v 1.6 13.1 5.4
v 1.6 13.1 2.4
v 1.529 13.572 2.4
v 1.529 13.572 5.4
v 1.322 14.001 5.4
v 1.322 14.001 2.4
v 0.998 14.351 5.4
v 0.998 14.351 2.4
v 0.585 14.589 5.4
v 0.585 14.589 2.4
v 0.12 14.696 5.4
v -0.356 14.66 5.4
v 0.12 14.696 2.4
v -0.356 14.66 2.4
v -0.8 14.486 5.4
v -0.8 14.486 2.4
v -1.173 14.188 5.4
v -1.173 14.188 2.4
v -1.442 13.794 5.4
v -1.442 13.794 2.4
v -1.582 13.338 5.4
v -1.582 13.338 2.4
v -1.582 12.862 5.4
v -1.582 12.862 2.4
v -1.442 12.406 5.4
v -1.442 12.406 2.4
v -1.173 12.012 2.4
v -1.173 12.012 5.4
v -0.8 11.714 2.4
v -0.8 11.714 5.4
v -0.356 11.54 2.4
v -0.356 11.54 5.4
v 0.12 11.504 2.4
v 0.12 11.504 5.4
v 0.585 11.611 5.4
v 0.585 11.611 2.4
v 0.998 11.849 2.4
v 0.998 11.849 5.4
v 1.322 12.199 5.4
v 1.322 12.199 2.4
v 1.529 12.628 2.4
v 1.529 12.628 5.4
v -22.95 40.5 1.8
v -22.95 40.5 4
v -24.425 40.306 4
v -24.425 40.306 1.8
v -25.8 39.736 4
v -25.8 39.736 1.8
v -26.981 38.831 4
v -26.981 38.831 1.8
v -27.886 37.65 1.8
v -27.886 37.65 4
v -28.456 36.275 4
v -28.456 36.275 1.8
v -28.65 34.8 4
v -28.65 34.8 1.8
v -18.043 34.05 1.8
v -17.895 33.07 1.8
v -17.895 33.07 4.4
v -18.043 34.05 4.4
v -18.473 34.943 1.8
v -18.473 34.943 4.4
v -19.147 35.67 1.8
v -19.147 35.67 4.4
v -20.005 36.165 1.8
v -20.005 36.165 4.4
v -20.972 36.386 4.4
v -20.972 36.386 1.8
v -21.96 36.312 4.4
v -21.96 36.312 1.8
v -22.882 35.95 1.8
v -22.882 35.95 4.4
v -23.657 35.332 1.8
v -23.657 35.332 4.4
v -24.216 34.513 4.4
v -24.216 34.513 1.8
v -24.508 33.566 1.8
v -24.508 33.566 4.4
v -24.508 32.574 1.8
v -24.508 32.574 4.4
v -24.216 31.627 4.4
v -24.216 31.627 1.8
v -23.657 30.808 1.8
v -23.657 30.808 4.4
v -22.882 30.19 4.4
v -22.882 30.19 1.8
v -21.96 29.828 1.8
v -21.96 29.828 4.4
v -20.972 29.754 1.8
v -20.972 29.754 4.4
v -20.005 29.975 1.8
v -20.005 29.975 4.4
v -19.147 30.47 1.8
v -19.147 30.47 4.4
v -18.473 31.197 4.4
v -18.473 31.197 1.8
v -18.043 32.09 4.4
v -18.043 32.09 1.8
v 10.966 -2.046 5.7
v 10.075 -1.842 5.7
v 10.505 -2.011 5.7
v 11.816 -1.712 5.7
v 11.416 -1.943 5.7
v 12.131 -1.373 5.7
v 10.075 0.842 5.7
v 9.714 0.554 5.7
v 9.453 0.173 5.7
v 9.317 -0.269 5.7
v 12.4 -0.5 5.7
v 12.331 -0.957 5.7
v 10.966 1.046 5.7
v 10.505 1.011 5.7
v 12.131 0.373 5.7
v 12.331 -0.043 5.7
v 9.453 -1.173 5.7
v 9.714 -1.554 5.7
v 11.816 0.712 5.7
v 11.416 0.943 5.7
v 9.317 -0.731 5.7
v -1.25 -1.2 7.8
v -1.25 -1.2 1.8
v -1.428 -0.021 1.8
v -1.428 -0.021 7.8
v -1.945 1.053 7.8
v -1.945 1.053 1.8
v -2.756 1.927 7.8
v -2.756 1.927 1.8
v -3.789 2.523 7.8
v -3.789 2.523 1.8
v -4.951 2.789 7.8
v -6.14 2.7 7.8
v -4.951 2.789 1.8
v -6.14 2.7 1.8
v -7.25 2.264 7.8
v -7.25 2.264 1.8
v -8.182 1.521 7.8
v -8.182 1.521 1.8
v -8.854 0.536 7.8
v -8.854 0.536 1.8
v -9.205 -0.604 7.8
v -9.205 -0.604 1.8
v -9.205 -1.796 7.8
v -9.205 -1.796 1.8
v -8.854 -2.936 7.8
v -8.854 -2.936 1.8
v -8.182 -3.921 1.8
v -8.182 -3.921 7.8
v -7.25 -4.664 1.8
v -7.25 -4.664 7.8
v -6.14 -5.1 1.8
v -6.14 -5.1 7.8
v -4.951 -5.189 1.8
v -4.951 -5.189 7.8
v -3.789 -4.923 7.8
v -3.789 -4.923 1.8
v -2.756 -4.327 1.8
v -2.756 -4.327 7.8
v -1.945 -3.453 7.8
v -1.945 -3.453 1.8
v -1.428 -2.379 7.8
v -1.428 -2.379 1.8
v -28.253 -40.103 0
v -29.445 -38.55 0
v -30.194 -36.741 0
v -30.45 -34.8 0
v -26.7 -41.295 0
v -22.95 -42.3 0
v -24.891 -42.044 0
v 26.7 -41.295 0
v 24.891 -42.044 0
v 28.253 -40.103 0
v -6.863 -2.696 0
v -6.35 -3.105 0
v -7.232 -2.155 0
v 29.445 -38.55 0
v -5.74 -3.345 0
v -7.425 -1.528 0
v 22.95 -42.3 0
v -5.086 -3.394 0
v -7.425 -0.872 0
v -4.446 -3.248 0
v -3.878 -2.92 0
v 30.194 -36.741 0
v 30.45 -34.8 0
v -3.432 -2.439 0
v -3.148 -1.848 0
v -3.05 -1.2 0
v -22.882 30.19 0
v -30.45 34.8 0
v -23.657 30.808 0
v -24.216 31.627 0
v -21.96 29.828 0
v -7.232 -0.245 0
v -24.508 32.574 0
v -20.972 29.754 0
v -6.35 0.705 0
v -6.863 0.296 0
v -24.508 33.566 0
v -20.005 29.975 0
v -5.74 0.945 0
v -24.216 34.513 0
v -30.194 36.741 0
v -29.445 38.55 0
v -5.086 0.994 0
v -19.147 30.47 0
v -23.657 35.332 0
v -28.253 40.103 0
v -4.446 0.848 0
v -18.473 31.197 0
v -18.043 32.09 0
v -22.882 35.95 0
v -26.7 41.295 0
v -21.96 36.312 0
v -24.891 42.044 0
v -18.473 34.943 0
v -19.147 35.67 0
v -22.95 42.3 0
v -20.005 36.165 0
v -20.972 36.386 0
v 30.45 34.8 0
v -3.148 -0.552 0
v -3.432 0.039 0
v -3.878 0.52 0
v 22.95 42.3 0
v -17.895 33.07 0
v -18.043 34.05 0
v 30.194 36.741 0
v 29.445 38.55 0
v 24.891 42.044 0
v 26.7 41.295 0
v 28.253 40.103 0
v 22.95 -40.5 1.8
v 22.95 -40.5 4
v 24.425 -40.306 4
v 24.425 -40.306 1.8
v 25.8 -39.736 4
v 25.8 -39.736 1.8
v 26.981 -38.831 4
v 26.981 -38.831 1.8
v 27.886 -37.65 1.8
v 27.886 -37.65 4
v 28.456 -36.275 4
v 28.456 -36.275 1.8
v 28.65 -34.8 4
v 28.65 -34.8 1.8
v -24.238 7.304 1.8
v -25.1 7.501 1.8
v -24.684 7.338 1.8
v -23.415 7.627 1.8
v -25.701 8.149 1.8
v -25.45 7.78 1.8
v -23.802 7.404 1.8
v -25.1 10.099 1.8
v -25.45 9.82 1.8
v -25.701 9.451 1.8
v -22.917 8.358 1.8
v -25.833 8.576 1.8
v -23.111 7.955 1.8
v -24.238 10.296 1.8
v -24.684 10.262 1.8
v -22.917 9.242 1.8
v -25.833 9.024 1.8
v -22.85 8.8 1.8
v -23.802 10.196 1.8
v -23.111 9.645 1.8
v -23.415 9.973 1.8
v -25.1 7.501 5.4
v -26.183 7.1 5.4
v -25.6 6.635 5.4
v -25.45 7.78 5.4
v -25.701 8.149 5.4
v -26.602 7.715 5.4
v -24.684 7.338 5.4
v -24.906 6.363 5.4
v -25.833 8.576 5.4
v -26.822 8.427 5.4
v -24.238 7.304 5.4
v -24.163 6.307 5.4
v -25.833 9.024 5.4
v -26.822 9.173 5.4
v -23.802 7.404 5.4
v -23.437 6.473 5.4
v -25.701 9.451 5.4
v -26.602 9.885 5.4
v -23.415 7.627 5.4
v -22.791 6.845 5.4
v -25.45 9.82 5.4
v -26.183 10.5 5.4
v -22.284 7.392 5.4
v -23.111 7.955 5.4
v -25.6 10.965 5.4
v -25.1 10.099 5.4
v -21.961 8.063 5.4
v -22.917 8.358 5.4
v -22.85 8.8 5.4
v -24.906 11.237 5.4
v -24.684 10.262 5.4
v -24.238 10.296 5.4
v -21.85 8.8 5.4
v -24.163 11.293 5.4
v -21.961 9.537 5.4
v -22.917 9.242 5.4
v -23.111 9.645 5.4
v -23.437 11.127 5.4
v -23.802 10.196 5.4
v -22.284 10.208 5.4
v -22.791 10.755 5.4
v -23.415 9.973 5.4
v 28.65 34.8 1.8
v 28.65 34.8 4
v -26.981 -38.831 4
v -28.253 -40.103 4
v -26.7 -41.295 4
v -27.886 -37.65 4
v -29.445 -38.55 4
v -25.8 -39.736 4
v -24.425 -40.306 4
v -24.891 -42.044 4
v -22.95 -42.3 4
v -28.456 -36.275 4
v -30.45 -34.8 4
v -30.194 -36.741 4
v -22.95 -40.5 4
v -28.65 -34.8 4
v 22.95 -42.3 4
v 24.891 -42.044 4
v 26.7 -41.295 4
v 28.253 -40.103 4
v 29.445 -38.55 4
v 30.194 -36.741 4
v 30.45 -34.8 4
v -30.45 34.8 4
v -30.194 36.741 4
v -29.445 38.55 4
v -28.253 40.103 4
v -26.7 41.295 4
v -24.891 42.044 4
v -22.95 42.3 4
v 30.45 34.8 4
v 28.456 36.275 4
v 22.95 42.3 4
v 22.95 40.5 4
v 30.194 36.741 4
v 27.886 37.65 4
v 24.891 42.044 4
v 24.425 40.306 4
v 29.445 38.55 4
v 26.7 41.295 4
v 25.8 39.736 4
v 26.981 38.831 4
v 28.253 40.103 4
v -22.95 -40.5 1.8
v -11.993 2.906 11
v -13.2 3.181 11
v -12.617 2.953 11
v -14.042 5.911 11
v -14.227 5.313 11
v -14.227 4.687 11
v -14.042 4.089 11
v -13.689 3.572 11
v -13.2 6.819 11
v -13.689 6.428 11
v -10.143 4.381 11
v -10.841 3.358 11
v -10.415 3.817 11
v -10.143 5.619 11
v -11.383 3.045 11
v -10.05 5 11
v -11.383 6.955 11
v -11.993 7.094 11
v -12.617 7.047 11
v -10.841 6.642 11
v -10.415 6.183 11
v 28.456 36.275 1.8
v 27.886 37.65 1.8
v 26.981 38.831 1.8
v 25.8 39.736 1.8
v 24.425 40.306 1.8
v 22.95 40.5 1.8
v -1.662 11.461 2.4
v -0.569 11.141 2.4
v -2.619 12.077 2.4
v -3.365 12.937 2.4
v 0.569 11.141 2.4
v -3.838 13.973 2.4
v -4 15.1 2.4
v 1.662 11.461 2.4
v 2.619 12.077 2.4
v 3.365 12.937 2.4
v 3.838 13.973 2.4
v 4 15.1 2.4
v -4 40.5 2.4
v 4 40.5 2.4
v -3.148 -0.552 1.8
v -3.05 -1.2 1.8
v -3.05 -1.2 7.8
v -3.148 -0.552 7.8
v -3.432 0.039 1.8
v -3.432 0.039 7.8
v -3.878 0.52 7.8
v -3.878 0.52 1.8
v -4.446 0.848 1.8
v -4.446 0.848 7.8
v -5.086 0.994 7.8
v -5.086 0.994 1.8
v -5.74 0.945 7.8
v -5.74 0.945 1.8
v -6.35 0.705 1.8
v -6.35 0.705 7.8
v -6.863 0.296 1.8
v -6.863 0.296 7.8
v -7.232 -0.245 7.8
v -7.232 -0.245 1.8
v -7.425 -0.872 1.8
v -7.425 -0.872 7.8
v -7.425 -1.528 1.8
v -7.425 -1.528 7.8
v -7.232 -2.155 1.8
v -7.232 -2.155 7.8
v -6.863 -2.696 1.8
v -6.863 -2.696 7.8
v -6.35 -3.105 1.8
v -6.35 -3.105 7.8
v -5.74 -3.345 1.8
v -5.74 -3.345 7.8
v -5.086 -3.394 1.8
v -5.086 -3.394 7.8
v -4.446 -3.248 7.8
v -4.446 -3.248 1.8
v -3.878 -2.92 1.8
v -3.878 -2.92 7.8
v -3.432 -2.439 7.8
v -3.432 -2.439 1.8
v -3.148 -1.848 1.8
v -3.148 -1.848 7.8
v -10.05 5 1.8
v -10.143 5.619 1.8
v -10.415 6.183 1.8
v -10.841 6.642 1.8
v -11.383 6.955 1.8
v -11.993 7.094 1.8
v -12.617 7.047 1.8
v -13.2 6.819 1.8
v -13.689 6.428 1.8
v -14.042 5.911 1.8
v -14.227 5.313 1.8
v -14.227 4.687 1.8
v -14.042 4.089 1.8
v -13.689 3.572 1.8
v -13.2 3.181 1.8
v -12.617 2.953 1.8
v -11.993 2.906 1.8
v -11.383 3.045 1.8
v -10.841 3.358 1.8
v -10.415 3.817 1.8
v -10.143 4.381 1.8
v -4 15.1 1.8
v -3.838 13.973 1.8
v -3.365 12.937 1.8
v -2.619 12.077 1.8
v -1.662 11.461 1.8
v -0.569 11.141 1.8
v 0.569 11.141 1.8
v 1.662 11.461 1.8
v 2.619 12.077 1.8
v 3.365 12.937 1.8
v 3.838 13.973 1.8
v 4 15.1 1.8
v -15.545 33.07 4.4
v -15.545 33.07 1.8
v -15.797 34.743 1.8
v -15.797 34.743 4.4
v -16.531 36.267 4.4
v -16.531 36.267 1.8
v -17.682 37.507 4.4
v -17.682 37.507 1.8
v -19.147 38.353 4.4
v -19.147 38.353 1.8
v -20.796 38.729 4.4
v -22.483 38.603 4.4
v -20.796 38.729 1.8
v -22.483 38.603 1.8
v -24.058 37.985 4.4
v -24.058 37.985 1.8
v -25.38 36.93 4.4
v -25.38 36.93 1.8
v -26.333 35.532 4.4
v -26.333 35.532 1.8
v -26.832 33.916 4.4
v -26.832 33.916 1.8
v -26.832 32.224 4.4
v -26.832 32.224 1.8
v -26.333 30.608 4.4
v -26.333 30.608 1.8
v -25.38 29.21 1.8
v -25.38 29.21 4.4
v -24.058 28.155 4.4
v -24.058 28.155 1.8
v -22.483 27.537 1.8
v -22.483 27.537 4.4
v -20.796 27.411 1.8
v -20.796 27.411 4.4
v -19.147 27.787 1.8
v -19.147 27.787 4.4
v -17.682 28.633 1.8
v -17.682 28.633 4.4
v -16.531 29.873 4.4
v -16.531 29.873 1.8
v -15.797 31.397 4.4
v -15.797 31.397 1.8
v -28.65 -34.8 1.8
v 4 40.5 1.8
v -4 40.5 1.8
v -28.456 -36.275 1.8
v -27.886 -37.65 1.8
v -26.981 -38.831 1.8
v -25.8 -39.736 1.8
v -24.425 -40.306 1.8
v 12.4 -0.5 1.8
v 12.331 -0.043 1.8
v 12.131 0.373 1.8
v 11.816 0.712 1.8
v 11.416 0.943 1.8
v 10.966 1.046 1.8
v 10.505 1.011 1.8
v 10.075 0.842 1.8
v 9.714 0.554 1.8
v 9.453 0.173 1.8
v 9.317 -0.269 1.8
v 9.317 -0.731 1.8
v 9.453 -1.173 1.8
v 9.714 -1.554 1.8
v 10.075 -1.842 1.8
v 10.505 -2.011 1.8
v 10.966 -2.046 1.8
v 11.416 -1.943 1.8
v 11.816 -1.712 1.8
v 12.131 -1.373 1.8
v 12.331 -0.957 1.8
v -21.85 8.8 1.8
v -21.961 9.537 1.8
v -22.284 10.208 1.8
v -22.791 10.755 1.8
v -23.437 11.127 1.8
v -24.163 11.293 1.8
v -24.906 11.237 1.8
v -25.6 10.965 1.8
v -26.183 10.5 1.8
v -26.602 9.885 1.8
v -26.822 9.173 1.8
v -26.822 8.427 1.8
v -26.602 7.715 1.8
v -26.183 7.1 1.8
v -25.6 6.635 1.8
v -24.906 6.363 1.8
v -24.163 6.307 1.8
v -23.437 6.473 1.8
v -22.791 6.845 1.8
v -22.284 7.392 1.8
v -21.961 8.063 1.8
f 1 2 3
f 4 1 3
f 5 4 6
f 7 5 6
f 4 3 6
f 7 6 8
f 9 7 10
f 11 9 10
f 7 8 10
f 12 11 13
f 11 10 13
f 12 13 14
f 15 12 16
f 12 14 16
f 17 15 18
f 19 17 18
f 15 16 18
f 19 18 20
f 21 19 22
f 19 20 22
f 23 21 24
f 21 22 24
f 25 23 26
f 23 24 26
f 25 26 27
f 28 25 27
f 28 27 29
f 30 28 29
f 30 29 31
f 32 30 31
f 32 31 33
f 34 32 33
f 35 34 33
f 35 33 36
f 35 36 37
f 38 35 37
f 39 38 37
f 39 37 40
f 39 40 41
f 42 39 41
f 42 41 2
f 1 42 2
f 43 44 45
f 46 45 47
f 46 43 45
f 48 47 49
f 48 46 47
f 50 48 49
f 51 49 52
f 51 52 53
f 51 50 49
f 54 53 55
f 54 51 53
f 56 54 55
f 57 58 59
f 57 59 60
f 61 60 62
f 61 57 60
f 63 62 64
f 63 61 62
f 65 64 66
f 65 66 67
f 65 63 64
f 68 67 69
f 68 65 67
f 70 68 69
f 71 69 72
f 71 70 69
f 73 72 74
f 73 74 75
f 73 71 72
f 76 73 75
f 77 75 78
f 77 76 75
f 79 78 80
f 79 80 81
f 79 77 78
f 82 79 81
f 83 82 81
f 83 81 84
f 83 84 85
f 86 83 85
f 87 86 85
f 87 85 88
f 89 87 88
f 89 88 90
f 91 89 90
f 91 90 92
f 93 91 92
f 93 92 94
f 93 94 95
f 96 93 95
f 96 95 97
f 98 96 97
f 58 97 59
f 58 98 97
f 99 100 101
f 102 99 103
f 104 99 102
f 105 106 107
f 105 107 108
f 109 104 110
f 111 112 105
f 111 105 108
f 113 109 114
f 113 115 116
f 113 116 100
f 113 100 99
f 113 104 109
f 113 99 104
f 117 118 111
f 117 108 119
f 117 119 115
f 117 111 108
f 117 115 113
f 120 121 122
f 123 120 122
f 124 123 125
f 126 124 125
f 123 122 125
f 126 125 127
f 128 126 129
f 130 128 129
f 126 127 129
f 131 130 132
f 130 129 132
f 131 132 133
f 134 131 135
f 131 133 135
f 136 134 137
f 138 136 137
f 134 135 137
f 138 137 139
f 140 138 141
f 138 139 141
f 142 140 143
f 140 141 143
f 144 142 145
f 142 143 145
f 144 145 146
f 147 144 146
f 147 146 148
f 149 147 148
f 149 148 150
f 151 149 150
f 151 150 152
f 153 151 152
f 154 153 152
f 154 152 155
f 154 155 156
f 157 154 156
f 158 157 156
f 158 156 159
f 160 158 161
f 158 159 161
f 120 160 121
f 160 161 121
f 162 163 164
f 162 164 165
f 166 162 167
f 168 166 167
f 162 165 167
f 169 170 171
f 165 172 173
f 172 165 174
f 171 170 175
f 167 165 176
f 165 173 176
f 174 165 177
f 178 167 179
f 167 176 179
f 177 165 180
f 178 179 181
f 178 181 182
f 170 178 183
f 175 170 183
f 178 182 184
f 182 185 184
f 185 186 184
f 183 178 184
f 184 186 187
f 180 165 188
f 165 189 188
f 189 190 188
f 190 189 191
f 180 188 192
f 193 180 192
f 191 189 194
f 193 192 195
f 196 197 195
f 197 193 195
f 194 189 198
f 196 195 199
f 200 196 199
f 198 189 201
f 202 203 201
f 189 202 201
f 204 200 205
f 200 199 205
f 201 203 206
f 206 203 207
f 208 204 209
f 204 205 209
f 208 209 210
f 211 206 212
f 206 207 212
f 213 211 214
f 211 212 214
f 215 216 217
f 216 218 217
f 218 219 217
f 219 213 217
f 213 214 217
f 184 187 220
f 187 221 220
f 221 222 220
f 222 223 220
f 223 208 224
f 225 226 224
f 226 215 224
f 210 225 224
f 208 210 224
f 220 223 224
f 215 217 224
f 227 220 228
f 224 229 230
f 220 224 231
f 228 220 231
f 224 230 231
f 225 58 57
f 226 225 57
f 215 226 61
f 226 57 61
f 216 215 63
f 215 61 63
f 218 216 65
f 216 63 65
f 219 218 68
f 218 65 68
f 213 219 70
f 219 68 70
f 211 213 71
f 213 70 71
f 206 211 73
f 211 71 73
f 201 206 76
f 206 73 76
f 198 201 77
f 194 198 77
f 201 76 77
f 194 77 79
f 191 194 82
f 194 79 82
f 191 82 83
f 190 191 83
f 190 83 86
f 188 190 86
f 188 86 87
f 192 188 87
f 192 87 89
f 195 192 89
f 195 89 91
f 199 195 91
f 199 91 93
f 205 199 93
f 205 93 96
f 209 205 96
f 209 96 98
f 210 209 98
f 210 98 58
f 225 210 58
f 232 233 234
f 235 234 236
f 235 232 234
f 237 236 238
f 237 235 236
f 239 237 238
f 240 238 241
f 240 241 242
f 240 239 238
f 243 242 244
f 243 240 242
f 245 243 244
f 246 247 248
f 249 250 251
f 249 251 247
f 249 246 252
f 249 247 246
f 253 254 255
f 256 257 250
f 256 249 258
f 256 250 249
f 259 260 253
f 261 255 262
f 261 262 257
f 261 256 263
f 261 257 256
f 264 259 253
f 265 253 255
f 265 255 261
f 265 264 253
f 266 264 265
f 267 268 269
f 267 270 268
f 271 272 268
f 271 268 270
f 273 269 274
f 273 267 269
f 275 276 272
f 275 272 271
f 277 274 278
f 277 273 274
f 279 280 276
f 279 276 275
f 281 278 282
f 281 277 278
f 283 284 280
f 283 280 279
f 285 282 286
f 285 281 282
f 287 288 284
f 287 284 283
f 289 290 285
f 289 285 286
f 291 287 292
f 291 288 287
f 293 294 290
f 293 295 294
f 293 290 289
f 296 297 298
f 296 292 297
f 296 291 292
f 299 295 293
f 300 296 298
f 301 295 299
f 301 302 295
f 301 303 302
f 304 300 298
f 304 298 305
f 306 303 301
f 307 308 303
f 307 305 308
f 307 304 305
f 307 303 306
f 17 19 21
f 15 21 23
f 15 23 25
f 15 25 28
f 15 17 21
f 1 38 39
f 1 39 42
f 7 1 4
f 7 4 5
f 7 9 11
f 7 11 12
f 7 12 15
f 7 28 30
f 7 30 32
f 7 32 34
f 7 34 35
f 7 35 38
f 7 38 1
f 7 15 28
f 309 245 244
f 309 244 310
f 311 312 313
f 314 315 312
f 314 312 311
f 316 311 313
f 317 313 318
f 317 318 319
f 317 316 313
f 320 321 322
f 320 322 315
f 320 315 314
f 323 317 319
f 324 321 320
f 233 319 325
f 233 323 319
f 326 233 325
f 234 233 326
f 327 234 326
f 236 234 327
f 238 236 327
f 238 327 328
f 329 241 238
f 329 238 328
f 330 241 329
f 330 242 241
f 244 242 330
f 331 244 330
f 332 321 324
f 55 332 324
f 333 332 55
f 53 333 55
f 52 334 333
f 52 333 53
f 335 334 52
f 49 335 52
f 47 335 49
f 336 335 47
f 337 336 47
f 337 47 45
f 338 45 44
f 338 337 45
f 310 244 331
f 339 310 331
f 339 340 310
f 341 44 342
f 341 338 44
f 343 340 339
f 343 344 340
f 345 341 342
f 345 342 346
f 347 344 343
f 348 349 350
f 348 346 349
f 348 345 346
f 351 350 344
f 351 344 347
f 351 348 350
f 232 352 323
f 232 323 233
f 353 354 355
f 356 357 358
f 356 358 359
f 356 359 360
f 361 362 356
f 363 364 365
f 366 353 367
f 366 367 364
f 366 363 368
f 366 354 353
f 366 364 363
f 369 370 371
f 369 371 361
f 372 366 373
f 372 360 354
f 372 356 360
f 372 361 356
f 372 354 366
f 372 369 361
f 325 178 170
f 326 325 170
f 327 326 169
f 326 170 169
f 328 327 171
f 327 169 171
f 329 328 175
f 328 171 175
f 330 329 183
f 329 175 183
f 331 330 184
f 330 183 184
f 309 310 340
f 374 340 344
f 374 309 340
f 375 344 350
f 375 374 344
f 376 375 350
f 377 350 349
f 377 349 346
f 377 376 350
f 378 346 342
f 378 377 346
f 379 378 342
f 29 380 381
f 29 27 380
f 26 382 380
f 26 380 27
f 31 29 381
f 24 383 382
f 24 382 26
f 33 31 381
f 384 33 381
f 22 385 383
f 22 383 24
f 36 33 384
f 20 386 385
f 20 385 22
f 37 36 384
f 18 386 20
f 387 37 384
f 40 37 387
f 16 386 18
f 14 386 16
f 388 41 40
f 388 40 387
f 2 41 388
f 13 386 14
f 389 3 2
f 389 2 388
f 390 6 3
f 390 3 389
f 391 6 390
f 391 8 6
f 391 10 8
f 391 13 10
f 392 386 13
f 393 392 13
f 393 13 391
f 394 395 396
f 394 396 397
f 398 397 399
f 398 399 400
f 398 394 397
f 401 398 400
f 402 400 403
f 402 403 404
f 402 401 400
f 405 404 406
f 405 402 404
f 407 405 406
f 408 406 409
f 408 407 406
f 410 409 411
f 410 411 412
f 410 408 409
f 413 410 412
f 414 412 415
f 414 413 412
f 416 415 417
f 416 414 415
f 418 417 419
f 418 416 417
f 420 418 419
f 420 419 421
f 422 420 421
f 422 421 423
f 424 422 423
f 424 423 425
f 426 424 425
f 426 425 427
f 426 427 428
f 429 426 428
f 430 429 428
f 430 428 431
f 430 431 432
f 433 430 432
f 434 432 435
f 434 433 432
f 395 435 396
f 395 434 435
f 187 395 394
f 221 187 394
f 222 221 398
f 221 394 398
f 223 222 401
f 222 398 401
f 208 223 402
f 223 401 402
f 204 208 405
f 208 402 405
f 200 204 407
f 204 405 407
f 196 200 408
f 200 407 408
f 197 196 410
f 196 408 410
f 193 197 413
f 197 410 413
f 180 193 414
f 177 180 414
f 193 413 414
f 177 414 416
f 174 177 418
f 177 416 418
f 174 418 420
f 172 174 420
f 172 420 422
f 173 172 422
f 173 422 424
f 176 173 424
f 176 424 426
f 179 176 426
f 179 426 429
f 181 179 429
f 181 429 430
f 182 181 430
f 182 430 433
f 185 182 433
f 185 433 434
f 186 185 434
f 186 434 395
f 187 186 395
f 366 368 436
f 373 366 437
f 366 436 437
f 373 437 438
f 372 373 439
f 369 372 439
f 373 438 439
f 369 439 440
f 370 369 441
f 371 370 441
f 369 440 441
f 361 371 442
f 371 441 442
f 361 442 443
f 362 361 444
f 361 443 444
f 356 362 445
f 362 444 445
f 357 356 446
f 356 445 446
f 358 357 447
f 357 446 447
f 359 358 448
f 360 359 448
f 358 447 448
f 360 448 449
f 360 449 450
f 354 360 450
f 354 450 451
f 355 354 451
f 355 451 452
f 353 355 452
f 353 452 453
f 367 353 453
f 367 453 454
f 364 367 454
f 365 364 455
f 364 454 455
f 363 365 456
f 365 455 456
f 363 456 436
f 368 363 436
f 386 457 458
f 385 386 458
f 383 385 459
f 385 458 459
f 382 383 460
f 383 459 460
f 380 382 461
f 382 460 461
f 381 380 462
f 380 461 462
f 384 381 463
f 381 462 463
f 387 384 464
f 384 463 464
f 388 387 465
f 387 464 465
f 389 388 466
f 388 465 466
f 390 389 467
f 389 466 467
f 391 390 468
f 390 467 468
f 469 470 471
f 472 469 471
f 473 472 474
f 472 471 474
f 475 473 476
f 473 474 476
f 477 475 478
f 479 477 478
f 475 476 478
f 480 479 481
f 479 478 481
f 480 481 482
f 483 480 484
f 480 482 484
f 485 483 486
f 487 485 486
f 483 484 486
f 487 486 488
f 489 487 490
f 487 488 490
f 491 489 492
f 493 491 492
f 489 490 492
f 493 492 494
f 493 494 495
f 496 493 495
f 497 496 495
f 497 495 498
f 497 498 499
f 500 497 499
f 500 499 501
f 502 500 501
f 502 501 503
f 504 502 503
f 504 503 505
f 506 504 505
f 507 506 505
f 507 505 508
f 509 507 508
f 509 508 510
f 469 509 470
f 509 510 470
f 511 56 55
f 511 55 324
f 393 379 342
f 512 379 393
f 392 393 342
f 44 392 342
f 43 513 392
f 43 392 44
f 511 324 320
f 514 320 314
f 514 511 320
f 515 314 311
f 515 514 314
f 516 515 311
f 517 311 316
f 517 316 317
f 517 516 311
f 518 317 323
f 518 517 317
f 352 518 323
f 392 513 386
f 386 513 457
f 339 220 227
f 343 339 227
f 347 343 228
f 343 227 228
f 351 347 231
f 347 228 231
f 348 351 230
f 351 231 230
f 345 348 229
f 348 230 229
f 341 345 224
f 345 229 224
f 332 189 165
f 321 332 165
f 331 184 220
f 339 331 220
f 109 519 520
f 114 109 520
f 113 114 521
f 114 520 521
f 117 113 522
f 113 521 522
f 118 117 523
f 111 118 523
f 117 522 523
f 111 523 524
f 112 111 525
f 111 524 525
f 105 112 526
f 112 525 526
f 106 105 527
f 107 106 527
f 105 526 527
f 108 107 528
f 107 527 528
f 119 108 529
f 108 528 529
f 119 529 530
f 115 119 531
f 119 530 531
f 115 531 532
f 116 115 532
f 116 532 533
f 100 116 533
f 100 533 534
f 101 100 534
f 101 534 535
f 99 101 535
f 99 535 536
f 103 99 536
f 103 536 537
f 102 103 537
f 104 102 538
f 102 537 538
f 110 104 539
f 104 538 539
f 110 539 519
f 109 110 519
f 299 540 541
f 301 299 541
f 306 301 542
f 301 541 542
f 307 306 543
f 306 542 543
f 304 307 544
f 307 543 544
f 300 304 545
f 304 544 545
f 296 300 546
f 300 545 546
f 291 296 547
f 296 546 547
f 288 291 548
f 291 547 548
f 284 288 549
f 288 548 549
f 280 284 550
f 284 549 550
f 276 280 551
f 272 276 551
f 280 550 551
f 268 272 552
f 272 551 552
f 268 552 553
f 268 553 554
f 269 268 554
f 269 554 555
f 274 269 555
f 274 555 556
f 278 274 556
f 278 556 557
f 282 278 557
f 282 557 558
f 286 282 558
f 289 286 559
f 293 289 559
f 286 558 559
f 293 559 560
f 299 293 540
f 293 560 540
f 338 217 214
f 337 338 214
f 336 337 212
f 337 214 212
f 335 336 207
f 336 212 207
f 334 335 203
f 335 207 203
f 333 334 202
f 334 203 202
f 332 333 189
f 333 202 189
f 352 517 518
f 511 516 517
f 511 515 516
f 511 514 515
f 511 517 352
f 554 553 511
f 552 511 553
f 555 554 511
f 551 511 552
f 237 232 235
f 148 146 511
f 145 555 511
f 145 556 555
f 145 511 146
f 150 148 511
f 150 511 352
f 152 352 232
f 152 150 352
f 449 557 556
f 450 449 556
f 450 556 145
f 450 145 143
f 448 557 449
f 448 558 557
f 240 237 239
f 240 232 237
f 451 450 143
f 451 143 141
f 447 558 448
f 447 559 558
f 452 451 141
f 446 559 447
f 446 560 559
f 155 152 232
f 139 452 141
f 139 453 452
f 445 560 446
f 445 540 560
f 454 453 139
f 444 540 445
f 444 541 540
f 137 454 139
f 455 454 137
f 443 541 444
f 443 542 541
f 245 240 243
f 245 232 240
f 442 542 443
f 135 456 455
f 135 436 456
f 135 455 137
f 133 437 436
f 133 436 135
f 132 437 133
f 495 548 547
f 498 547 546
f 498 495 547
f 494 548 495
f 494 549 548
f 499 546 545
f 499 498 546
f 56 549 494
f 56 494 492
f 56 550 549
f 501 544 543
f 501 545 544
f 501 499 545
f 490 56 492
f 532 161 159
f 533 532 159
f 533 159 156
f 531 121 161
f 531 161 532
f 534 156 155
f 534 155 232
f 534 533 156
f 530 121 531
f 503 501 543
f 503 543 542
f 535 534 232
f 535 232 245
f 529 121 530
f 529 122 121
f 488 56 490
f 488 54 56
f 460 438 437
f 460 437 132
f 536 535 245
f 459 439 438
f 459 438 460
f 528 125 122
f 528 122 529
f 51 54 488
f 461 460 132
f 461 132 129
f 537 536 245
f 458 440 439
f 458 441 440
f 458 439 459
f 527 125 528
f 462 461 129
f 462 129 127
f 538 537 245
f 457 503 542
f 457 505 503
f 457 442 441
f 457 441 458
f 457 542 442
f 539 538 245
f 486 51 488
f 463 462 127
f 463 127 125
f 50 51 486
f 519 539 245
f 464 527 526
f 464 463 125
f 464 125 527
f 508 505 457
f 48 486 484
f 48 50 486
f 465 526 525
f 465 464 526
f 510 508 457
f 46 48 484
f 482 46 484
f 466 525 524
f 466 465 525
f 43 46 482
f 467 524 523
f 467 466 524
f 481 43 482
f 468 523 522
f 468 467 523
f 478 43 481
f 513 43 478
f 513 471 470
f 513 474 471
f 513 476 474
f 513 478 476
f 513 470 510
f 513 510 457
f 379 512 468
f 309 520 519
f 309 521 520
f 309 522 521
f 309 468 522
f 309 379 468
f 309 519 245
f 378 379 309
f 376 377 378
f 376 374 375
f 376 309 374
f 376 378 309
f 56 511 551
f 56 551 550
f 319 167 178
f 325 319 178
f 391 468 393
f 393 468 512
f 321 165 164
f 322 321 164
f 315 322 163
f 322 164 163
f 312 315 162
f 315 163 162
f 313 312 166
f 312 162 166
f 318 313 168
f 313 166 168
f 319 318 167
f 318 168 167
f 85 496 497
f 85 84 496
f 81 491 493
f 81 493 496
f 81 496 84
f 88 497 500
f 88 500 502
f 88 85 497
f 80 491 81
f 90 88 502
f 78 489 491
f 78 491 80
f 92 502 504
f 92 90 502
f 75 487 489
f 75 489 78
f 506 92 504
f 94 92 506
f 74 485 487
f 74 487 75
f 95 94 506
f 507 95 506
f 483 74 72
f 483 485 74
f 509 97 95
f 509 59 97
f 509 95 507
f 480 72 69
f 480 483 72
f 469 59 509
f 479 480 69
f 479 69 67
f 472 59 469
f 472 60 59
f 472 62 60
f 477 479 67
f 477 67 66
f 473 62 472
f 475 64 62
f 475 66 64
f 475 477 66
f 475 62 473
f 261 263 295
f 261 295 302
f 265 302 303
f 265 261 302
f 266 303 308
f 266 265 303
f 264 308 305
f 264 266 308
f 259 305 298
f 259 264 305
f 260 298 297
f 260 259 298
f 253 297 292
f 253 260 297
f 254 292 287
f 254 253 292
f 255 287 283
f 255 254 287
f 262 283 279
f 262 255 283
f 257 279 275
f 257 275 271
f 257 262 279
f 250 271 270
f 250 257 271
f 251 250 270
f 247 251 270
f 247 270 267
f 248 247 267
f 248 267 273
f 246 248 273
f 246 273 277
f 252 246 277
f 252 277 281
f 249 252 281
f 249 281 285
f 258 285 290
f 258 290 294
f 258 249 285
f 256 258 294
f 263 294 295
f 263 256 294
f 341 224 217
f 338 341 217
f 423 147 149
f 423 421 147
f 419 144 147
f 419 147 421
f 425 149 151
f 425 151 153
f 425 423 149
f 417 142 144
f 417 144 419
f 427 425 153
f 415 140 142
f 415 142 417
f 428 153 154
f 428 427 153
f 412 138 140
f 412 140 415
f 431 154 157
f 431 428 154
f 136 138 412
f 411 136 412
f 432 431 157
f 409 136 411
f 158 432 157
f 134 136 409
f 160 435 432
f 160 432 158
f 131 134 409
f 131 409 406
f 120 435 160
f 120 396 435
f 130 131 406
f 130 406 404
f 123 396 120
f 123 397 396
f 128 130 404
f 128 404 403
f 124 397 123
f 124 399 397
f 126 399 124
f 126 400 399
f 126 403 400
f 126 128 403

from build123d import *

# Parameters (mm, degrees)
F1_DEPTH  = 4
F2_T      = -1.8
F3_R      = 3.325
F3_R_2    = 2.2
F4_DEPTH  = 1.801
F3_R_3    = 1.6
F5_DEPTH  = 0.6
F3_R_4    = 5.675
F6_DEPTH  = 2.6
F3_R_5    = 2.5
F3_R_6    = 1.5
F7_DEPTH  = 3.6
F3_R_7    = 1.55
F8_DEPTH  = 3.9
F3_R_8    = 4
F9_DEPTH  = 6
F3_R_9    = 2.1
F10_DEPTH = 9.2


with BuildPart() as f1:
    # F0 (on Top) → F1 (new body)
    with BuildSketch(Plane.XY):
        with BuildLine():
            Line((-22.95, -42.3), (22.95, -42.3))
            ThreePointArc((22.95, -42.3), (28.2533008589, -40.1033008589), (30.45, -34.8))
            Line((30.45, -34.8), (30.45, 34.8))
            ThreePointArc((30.45, 34.8), (28.2533008589, 40.1033008589), (22.95, 42.3))
            Line((22.95, 42.3), (-22.95, 42.3))
            ThreePointArc((-22.95, 42.3), (-28.2533008589, 40.1033008589), (-30.45, 34.8))
            Line((-30.45, 34.8), (-30.45, -34.8))
            ThreePointArc((-30.45, -34.8), (-28.2533008589, -40.1033008589), (-22.95, -42.3))
        make_face()
    extrude(amount=F1_DEPTH)

    # F2
    f2_openings = [f1.faces().sort_by_distance(p)[0] for p in [
        (0, 0, 4),
    ]]
    offset(amount=F2_T, openings=f2_openings)

    # F3 (on face) → F4 (cut, through all)
    with BuildSketch(Plane.XY.offset(1.8)):
        with Locations((-21.22, 33.07)):
            Circle(F3_R)
        with Locations((-5.25, -1.2)):
            Circle(F3_R_2)
    extrude(amount=-F4_DEPTH, mode=Mode.SUBTRACT)

    # F3 (on face) → F5 (join)
    with BuildSketch(Plane.XY.offset(1.8)):
        with BuildLine():
            ThreePointArc((-4, 15.1), (0, 11.1), (4, 15.1))
            Line((4, 15.1), (4, 40.5))
            Line((4, 40.5), (-4, 40.5))
            Line((-4, 40.5), (-4, 15.1))
        make_face()
        with Locations((0, 13.1)):
            Circle(F3_R_3, mode=Mode.SUBTRACT)
    extrude(amount=F5_DEPTH)

    # F3 (on face) → F6 (join)
    with BuildSketch(Plane.XY.offset(1.8)):
        with Locations((-21.22, 33.07)):
            Circle(F3_R_4)
        with Locations((-21.22, 33.07)):
            Circle(F3_R, mode=Mode.SUBTRACT)
    extrude(amount=F6_DEPTH)

    # F3 (on face) → F7 (join)
    with BuildSketch(Plane.XY.offset(1.8)):
        with Locations((0, 13.1)):
            Circle(F3_R_3)
        with Locations((-24.35, 8.8)):
            Circle(F3_R_5)
        with Locations((-24.35, 8.8)):
            Circle(F3_R_6, mode=Mode.SUBTRACT)
    extrude(amount=F7_DEPTH)

    # F3 (on face) → F8 (join)
    with BuildSketch(Plane.XY.offset(1.8)):
        with Locations((10.85, -0.5)):
            Circle(F3_R_7)
    extrude(amount=F8_DEPTH)

    # F3 (on face) → F9 (join)
    with BuildSketch(Plane.XY.offset(1.8)):
        with Locations((-5.25, -1.2)):
            Circle(F3_R_8)
        with Locations((-5.25, -1.2)):
            Circle(F3_R_2, mode=Mode.SUBTRACT)
    extrude(amount=F9_DEPTH)

    # F3 (on face) → F10 (join)
    with BuildSketch(Plane.XY.offset(1.8)):
        with Locations((-12.15, 5)):
            Circle(F3_R_9)
    extrude(amount=F10_DEPTH)


solid = f1.part
